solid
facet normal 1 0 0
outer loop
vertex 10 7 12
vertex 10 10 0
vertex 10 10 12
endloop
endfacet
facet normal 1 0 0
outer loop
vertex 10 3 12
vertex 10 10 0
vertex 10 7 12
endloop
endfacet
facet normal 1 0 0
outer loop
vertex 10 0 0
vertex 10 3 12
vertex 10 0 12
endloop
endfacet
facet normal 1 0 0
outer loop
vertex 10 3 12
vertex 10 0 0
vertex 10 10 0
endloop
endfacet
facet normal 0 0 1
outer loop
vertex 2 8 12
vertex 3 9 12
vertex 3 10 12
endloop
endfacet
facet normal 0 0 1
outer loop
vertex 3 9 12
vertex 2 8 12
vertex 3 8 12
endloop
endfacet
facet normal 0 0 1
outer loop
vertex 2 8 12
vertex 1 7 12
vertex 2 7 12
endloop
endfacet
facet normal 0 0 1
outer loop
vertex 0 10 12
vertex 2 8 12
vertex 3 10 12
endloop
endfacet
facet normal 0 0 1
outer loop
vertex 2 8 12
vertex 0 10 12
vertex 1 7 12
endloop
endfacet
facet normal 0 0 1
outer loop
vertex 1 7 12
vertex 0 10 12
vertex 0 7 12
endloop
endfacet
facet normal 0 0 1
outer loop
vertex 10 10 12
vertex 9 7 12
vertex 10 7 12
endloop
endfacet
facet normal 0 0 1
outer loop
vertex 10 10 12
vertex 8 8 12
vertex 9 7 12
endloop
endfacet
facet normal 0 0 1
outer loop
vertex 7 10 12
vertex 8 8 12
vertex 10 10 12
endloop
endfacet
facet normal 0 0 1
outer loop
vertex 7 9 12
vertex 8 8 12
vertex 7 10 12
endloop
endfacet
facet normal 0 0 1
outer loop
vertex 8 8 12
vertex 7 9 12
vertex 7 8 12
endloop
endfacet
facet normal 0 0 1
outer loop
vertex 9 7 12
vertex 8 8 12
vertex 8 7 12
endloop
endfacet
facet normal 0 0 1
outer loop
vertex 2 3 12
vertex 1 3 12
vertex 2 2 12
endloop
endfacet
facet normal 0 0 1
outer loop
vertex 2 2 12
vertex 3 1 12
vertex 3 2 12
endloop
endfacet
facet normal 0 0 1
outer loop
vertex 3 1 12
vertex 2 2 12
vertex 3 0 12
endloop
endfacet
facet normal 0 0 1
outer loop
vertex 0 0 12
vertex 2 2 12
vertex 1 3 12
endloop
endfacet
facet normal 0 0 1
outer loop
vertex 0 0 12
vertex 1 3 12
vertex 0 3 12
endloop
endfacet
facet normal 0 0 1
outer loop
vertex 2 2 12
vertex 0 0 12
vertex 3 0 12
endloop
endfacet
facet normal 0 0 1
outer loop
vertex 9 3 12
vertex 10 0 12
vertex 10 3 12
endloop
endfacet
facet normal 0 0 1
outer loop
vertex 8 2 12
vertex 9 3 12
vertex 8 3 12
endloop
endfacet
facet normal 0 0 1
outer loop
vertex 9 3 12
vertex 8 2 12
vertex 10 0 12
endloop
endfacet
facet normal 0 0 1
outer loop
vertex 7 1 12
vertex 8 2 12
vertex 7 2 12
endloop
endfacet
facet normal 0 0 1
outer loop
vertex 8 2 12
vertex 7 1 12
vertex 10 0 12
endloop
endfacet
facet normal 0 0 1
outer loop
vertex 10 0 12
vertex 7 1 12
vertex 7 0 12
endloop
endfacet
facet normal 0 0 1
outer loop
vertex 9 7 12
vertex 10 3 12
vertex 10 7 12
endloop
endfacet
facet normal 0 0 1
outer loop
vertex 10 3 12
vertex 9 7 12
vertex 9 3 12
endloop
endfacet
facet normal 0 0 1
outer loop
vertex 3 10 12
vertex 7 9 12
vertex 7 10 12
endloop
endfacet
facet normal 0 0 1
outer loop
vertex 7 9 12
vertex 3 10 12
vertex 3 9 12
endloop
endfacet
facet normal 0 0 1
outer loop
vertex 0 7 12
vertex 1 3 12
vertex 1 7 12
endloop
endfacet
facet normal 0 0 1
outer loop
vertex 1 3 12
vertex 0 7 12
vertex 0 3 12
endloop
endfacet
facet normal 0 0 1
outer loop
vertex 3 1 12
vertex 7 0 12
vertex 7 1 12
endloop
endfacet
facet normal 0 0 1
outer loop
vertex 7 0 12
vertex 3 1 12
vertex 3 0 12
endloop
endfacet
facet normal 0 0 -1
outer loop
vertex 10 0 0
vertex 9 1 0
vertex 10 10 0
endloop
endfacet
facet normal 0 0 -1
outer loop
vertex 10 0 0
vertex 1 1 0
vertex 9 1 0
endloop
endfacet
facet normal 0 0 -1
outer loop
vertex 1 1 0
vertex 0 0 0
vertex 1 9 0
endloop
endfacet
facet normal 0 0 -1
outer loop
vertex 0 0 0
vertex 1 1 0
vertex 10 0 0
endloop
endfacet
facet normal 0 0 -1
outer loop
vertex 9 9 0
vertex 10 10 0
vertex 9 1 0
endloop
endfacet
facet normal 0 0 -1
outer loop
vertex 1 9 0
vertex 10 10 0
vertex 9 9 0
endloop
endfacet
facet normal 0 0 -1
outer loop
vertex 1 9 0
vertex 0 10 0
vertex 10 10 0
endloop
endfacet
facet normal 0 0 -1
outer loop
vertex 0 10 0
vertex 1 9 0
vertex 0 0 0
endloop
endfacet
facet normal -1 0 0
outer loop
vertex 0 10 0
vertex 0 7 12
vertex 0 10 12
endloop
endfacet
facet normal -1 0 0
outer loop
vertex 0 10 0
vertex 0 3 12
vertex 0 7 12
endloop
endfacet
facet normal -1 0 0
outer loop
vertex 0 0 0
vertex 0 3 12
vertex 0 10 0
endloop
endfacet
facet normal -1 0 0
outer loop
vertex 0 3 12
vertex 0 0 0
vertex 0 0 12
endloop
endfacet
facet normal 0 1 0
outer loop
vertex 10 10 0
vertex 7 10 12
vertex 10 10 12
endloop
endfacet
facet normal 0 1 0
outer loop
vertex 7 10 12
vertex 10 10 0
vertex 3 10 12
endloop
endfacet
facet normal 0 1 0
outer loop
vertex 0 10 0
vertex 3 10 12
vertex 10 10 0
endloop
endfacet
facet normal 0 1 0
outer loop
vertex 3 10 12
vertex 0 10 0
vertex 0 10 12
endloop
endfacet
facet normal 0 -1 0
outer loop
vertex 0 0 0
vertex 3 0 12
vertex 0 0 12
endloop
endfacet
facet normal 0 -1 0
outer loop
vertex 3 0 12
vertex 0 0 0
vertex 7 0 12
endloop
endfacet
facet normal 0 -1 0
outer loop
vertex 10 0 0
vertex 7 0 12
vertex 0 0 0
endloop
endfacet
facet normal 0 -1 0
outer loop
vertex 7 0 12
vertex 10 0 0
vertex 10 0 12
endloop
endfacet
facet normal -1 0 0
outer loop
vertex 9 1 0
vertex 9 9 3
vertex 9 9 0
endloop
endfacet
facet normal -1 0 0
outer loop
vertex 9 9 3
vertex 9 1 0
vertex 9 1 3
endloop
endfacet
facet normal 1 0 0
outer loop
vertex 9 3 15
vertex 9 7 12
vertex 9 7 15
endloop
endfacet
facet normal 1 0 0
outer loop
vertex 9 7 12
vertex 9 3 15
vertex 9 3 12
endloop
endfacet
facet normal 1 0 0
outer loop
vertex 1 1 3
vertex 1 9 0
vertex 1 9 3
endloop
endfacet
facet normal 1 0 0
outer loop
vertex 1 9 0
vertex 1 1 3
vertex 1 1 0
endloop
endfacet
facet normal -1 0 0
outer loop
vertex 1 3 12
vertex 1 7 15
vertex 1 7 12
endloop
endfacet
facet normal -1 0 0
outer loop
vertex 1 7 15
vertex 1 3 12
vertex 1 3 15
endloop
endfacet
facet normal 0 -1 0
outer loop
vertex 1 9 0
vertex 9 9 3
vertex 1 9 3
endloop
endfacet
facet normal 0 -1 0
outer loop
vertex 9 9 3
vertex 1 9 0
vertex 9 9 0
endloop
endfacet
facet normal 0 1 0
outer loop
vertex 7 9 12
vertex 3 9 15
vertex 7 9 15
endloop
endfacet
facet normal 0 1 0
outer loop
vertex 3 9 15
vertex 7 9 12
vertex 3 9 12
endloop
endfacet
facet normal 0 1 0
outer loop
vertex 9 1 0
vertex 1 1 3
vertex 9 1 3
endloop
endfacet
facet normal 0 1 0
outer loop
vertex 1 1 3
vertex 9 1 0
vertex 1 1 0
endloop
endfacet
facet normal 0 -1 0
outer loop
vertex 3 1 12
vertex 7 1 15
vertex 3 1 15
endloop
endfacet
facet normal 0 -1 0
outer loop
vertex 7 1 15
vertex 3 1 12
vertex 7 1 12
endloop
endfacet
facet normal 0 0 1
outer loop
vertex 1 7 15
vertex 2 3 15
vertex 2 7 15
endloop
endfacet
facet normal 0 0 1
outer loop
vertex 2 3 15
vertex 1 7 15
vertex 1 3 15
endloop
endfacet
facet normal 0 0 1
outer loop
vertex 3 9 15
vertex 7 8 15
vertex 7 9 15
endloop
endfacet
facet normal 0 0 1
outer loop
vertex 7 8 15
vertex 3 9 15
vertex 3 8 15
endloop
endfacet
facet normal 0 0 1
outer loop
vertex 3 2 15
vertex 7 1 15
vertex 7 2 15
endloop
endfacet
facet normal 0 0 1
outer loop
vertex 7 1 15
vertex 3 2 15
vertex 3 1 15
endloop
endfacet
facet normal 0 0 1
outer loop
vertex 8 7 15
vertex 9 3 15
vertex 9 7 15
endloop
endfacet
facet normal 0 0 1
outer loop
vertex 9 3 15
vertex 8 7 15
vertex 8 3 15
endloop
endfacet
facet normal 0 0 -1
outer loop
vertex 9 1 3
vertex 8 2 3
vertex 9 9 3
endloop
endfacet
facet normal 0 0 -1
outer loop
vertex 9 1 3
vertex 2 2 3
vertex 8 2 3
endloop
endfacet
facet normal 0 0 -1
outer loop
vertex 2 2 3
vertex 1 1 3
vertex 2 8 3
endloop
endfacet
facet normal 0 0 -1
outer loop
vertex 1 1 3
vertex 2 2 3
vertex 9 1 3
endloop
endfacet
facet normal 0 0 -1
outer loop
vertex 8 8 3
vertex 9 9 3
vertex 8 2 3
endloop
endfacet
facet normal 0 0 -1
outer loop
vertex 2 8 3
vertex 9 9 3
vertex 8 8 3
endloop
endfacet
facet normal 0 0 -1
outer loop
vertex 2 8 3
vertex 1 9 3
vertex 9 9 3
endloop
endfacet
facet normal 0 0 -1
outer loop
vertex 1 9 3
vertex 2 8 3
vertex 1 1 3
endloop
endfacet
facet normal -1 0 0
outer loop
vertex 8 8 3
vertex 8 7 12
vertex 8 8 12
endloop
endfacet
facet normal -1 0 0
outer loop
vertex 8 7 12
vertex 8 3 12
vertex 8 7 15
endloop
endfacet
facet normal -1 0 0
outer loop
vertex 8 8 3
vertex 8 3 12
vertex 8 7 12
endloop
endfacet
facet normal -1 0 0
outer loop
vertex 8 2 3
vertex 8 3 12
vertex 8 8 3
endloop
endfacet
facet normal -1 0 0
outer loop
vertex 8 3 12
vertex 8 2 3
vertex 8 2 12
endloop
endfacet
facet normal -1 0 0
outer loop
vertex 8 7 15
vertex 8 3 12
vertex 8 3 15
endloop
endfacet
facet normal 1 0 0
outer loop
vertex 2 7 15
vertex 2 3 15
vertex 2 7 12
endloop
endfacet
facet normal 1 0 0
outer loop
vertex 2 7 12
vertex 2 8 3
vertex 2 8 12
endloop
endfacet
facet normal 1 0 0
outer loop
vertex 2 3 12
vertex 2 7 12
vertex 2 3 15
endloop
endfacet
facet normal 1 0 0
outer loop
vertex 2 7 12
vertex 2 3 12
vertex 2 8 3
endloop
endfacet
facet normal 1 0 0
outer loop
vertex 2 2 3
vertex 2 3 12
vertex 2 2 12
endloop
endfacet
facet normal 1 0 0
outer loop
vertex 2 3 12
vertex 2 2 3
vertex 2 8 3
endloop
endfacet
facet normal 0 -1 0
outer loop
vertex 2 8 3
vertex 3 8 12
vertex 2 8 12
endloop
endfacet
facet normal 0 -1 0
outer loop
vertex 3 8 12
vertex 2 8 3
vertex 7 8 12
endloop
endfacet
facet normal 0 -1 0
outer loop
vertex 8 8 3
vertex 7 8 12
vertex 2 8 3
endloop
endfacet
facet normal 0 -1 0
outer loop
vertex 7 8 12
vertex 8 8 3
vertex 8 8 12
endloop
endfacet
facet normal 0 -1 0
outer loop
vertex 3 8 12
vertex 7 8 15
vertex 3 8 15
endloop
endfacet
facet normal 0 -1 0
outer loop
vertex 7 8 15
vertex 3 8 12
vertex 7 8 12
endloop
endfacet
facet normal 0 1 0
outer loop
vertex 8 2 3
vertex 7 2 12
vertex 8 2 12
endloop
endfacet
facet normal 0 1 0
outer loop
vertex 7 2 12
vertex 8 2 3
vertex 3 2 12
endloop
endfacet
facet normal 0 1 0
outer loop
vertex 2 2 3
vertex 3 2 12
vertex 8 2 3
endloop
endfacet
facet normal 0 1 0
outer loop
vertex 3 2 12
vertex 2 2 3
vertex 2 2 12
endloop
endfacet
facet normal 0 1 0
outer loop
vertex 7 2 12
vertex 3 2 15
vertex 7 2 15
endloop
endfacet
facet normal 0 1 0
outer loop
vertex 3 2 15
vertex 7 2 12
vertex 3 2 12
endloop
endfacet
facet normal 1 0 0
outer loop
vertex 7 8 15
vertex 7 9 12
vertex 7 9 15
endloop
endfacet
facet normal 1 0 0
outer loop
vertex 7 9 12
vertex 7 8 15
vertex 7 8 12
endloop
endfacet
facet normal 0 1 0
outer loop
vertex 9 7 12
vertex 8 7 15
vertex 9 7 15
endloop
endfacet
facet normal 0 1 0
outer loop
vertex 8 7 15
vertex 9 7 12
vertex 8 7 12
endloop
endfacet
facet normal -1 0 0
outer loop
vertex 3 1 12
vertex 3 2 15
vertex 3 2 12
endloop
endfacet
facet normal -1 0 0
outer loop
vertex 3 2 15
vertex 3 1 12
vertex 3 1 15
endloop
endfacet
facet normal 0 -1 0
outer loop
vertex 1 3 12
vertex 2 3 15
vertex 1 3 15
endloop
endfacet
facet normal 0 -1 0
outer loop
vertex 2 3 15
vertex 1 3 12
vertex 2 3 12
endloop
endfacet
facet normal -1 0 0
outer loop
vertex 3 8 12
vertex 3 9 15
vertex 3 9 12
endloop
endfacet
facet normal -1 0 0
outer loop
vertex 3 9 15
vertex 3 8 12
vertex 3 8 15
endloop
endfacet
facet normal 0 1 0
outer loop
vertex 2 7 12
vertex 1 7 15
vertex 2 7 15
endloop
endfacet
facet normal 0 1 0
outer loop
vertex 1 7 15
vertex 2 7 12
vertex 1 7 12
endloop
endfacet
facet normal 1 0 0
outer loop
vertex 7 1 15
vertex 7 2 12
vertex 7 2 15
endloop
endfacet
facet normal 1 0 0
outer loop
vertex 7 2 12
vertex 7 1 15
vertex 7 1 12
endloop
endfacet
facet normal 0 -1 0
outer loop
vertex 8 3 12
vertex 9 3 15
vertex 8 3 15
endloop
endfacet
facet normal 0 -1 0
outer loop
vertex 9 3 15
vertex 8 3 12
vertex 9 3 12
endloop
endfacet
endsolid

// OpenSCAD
difference(){
    union(){
        difference(){
            cube(size=[10, 10, 12]);
            translate(v=[1, 1, 0]){
                cube(size=[8, 8, 12]);
            };
        };
        translate(v=[1, 1, 3]){
            difference(){
                cube(size=[8, 8, 12]);
                translate(v=[1, 1, 0]){
                    cube(size=[6, 6, 12]);
                };
            };
        };
    };
    union(){
        translate(v=[7, 7, 12]){
            cube(size=[3, 3, 5]);
        };
        translate(v=[0, 0, 12]){
            cube(size=[3, 3, 5]);
        };
        translate(v=[0, 7, 12]){
            cube(size=[3, 3, 5]);
        };
        translate(v=[7, 0, 12]){
            cube(size=[3, 3, 5]);
        };
    };
};
